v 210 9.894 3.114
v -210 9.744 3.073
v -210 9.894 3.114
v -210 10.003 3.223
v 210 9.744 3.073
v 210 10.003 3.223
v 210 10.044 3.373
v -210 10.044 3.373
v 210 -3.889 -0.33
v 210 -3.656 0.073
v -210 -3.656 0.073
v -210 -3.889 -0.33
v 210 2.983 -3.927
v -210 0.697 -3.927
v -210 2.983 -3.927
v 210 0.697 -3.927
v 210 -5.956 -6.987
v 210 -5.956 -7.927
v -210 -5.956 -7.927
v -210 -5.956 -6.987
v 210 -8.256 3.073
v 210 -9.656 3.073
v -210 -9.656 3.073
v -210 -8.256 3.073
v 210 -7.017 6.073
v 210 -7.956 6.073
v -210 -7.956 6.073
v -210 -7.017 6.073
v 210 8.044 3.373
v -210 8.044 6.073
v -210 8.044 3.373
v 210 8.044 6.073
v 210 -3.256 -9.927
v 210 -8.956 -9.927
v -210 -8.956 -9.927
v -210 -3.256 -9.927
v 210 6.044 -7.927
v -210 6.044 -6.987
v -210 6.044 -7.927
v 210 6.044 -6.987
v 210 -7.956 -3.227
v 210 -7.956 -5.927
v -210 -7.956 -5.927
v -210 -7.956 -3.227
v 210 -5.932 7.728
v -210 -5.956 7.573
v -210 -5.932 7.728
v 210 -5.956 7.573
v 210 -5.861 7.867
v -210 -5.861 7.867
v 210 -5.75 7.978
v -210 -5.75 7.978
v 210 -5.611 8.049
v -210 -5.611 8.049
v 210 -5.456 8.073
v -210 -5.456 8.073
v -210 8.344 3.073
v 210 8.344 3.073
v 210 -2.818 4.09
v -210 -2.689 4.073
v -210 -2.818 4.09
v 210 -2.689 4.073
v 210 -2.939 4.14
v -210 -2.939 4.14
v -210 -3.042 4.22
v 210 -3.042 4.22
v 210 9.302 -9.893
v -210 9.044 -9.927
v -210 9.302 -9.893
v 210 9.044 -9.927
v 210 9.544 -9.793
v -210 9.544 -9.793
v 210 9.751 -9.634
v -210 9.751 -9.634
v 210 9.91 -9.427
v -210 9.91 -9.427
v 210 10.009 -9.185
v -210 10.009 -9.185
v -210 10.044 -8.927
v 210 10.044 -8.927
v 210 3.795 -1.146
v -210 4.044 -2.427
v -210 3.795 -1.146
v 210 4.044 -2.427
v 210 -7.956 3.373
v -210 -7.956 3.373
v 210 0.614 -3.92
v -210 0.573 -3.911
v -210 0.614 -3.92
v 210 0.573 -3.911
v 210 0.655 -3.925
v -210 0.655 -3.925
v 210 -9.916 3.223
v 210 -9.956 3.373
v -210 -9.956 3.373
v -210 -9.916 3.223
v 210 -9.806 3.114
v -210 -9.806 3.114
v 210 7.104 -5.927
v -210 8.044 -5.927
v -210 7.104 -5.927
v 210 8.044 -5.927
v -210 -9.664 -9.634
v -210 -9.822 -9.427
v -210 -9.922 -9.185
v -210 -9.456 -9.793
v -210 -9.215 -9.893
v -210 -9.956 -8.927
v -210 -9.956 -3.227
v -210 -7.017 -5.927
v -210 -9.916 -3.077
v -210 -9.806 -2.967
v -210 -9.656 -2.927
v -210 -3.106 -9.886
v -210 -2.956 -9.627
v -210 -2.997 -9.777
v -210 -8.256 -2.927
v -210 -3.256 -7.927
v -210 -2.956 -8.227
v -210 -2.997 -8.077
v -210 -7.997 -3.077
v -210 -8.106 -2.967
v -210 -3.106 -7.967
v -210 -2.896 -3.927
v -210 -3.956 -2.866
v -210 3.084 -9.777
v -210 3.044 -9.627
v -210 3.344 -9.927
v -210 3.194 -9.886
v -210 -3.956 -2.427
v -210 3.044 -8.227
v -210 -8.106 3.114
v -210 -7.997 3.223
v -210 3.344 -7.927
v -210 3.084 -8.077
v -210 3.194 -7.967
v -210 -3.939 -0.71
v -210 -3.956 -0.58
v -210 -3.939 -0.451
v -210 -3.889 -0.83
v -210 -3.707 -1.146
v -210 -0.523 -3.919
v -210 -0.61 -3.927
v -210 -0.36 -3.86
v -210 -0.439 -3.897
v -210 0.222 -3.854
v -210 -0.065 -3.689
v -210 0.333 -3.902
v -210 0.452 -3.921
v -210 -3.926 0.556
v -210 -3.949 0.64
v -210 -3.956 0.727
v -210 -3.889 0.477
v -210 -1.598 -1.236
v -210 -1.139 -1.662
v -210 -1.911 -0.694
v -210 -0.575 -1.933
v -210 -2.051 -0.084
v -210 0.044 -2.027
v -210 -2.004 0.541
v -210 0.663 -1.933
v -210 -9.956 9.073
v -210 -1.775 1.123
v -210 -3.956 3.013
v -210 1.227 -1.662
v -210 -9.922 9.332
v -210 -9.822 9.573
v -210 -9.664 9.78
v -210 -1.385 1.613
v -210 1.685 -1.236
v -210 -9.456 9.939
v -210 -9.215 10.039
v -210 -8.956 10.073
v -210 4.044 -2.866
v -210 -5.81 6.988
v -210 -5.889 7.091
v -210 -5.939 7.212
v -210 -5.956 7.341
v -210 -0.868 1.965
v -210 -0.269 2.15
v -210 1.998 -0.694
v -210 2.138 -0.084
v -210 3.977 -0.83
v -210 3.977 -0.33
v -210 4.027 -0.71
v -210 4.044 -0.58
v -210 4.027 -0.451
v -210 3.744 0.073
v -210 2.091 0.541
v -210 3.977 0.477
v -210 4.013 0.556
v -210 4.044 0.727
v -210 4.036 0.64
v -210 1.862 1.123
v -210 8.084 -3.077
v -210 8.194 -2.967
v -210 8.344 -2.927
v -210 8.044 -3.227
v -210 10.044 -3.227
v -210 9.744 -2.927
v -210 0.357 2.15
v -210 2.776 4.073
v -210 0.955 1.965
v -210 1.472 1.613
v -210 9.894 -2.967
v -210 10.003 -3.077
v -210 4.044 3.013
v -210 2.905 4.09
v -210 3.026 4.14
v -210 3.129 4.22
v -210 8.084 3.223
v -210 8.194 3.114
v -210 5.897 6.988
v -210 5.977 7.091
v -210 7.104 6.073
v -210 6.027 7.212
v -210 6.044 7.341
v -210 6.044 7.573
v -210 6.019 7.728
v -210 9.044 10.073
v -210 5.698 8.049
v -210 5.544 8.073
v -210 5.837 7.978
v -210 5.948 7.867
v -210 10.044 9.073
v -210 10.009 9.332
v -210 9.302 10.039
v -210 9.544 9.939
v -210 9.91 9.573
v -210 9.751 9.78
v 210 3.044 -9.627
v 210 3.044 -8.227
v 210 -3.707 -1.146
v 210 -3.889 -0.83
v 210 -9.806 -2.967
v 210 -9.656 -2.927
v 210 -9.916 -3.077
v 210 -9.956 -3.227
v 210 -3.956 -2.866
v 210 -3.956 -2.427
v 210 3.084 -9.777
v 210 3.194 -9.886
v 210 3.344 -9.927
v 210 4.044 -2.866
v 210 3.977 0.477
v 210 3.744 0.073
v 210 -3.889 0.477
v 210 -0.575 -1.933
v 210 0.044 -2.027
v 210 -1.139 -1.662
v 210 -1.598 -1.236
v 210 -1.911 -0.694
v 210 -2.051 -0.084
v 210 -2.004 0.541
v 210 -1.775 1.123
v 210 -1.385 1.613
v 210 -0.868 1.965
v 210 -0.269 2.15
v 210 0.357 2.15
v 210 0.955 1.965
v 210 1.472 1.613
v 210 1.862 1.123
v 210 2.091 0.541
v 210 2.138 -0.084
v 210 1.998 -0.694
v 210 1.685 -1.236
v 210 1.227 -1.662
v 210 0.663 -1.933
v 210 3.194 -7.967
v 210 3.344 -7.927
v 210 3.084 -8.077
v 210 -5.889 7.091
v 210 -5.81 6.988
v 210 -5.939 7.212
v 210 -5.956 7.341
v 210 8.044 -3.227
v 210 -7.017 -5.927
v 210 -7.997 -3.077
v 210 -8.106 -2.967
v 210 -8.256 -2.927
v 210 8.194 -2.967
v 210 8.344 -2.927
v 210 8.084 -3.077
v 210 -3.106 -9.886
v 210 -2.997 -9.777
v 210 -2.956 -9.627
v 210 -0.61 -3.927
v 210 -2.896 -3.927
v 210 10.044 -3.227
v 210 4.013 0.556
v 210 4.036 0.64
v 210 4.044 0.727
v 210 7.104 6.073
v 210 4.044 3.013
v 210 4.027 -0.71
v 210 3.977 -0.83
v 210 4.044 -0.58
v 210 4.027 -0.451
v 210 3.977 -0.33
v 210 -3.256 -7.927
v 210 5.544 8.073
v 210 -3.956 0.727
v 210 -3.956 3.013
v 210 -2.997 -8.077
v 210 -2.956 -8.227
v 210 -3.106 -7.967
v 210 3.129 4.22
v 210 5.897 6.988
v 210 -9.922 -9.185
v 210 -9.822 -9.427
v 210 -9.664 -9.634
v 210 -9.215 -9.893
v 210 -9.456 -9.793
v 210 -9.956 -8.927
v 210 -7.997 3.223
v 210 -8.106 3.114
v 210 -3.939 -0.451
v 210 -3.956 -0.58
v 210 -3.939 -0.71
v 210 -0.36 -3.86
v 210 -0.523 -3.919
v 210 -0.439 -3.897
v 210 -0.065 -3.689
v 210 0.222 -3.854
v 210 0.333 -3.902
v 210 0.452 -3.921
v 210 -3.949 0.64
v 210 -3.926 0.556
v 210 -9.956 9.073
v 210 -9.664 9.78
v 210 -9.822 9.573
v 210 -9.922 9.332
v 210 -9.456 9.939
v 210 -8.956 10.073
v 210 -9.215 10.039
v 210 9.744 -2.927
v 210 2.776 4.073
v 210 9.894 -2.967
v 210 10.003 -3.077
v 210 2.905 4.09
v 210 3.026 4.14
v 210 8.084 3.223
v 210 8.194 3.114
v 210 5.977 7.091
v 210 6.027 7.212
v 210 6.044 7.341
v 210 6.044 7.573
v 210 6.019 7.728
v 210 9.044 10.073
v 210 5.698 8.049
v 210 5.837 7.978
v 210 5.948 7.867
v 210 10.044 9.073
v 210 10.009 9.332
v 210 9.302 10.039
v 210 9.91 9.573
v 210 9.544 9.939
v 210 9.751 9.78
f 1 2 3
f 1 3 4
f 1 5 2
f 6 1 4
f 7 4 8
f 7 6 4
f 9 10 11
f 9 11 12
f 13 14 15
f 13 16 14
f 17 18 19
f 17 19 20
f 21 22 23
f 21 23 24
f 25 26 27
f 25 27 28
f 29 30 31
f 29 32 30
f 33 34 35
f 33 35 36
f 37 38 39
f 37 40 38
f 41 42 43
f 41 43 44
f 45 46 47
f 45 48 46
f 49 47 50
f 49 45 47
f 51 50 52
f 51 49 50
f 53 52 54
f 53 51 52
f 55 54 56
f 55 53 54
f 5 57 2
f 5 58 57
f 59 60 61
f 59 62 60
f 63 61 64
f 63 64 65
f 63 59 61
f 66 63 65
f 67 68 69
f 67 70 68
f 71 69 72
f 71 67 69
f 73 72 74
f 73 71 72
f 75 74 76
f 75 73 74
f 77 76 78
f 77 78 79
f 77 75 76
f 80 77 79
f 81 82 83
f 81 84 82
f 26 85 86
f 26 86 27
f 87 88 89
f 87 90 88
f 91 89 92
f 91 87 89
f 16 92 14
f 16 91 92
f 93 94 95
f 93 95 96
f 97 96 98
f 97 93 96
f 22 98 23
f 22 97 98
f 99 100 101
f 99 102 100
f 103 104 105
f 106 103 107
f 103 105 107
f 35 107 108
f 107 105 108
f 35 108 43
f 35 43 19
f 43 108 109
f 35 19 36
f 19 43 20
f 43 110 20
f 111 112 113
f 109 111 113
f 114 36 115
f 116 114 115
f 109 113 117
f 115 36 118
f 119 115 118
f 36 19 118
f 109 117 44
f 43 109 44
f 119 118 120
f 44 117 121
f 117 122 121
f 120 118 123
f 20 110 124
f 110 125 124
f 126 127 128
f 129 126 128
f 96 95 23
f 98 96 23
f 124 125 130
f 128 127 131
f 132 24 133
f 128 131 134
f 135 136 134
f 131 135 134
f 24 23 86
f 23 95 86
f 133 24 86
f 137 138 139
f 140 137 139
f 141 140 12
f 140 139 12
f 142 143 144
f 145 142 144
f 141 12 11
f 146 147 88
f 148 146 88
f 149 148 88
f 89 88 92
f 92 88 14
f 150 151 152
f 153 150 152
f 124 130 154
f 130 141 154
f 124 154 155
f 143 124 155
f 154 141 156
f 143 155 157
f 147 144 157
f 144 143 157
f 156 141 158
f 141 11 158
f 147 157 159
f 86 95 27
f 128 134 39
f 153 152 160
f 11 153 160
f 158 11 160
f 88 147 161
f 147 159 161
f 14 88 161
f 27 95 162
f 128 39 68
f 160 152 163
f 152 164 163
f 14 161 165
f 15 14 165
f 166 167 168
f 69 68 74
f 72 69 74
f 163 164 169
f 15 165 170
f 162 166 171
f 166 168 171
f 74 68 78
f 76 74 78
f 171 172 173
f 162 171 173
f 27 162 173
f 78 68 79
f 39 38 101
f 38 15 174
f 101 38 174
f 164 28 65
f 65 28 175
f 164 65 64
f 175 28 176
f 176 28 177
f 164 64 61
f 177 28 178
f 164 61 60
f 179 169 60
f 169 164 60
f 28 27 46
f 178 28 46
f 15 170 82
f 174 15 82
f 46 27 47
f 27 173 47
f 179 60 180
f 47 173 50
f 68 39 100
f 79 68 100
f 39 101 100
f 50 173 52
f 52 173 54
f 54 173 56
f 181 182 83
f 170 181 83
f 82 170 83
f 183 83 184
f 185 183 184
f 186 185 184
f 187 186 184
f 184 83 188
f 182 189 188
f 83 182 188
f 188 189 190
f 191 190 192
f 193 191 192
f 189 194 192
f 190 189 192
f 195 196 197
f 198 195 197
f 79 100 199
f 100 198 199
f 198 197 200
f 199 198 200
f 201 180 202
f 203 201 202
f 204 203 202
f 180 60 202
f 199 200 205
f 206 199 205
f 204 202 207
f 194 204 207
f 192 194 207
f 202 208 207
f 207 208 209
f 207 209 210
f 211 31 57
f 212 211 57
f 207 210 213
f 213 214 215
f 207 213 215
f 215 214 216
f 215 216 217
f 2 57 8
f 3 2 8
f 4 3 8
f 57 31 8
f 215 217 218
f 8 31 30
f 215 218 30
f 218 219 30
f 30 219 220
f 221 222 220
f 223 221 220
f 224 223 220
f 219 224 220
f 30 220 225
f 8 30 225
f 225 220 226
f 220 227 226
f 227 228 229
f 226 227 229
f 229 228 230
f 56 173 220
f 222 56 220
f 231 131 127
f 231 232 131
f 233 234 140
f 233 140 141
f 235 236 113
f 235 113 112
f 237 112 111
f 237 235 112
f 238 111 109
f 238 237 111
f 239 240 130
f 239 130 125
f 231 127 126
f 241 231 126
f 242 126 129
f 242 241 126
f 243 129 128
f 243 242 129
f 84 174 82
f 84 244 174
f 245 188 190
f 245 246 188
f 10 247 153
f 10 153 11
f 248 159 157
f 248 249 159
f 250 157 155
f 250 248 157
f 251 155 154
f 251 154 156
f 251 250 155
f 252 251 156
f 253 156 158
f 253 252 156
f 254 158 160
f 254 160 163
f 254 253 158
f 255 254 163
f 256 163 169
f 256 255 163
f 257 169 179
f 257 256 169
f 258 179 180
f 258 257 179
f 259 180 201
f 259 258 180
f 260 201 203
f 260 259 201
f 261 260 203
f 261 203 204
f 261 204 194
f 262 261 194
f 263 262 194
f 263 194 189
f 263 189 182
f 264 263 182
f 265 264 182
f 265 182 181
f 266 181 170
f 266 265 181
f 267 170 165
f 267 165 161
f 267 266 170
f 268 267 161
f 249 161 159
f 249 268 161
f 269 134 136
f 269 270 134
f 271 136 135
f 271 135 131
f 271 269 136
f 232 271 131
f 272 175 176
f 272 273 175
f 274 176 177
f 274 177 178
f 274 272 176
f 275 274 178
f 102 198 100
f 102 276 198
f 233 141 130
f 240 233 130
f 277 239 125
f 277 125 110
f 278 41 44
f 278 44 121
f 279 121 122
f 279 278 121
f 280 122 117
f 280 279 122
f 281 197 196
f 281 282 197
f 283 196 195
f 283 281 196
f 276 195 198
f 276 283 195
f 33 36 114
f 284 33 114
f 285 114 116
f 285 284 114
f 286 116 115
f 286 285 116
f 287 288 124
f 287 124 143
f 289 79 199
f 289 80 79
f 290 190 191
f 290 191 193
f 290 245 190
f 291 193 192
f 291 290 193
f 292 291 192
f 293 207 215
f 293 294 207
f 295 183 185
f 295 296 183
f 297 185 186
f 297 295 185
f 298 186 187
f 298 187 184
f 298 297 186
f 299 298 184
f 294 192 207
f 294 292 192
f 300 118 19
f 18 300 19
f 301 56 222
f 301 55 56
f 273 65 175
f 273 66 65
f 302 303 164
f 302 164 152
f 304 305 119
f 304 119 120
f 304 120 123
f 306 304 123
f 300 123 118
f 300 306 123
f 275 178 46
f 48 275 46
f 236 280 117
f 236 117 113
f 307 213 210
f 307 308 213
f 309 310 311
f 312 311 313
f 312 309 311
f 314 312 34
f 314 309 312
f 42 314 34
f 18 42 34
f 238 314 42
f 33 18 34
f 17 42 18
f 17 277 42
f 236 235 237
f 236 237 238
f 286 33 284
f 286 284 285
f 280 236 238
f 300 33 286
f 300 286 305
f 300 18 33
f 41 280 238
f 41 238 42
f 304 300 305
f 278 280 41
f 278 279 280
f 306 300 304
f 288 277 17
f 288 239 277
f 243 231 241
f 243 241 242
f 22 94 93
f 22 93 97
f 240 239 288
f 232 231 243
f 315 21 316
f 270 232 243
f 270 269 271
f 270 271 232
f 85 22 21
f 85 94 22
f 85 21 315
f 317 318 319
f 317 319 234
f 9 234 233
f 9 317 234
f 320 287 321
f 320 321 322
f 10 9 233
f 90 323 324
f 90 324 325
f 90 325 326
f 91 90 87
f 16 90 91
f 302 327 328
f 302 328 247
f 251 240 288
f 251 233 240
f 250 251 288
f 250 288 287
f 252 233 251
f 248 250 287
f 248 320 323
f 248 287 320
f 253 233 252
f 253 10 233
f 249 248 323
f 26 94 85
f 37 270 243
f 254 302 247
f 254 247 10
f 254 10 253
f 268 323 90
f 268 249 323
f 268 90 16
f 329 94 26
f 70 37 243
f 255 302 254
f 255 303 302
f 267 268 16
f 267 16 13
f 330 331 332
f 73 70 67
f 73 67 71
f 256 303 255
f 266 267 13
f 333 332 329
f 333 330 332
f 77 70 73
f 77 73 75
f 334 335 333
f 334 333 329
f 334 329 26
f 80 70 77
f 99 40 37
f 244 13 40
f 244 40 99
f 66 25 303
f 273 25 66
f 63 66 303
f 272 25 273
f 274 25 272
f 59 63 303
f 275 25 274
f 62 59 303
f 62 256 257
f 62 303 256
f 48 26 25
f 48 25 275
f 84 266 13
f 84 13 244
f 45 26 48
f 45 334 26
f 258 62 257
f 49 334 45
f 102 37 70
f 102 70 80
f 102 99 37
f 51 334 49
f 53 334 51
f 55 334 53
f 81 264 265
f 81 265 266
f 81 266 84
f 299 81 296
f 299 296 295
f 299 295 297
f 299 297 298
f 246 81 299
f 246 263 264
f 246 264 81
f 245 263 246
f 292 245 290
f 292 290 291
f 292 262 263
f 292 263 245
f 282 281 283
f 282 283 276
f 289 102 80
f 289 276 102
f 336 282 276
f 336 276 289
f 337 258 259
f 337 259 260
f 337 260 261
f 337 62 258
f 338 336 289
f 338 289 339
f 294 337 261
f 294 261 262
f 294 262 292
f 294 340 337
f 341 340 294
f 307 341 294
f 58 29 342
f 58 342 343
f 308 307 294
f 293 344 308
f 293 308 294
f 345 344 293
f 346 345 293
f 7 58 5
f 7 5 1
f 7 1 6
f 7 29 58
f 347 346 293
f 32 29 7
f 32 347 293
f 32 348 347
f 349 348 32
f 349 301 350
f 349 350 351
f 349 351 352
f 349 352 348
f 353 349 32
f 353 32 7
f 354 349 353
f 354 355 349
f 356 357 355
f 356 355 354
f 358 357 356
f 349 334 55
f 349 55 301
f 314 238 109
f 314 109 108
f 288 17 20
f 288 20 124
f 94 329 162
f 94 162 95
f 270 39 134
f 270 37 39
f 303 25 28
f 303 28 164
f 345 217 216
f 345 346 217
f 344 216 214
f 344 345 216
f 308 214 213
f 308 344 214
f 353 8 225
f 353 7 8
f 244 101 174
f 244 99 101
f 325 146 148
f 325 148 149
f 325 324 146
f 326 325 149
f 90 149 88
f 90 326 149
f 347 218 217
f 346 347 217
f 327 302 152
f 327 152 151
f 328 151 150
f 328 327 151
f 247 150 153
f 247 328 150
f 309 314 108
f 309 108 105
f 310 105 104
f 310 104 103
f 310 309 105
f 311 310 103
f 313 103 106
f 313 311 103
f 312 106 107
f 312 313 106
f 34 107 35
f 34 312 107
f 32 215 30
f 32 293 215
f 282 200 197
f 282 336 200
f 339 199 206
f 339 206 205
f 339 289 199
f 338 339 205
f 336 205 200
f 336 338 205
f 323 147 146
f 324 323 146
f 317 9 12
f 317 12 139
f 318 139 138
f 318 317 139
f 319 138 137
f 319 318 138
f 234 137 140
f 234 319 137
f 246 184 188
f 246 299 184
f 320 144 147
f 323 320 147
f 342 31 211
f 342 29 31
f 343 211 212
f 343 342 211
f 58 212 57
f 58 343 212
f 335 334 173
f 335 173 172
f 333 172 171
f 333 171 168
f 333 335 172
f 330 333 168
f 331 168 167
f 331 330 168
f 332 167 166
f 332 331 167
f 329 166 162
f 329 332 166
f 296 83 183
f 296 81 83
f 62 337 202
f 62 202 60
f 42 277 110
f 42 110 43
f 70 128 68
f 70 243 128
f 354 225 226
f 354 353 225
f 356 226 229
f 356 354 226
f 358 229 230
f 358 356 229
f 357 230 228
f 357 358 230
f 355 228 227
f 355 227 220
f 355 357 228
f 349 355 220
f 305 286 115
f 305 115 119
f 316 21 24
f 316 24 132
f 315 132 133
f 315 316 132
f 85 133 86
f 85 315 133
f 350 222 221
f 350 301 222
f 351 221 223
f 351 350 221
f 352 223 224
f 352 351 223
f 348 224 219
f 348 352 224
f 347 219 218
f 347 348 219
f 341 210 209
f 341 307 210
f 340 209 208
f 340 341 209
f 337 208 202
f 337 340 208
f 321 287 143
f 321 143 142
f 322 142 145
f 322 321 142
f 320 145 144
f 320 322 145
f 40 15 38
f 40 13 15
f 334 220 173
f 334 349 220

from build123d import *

# Parameters (mm, degrees)
F1_DEPTH = 210


# Not quite as in the source:
# - ends of sketch curves that miss each other by under 0.0002 mm in the source are joined


with BuildPart() as f1:
    # F0 (on Right) → F1 (new body, symmetric)
    with BuildSketch(Plane.YZ):
        with BuildLine():
            Line((9.043565, 10.073321), (0.043565, 10.073321))
            Line((0.043565, 10.073321), (-8.956435, 10.073321))
            ThreePointArc((-8.956435, 10.073321), (-9.6635417812, 9.7804277812), (-9.956435, 9.073321))
            Line((-9.956435, 9.073321), (-9.956435, 3.373321))
            ThreePointArc((-9.956435, 3.373321), (-9.8685670344, 3.1611889656), (-9.656435, 3.073321))
            Line((-9.656435, 3.073321), (-8.256435, 3.073321))
            ThreePointArc((-8.256435, 3.073321), (-8.0443029656, 3.1611889656), (-7.956435, 3.373321))
            Line((-7.956435, 3.373321), (-7.956435, 6.073321))
            Line((-7.956435, 6.073321), (-7.017095, 6.073321))
            Line((-7.017095, 6.073321), (-3.956435, 3.012661))
            Line((-3.956435, 3.012661), (-3.956435, 0.726911))
            ThreePointArc((-3.956435, 0.726911), (-3.9393979324, 0.5975015494), (-3.8894477764, 0.4769111291))
            Line((-3.8894477764, 0.4769111291), (-3.656435, 0.073321))
            Line((-3.656435, 0.073321), (-3.889448, -0.330269))
            ThreePointArc((-3.889448, -0.330269), (-3.956435, -0.580269), (-3.8894477764, -0.8302688709))
            Line((-3.8894477764, -0.8302688709), (-3.707412, -1.145565))
            Line((-3.707412, -1.145565), (-3.956435, -2.426679))
            Line((-3.956435, -2.426679), (-3.956435, -2.866019))
            Line((-3.956435, -2.866019), (-7.017095, -5.926679))
            Line((-7.017095, -5.926679), (-7.956435, -5.926679))
            Line((-7.956435, -5.926679), (-7.956435, -3.226679))
            ThreePointArc((-7.956435, -3.226679), (-8.0443029656, -3.0145469656), (-8.256435, -2.926679))
            Line((-8.256435, -2.926679), (-9.656435, -2.926679))
            ThreePointArc((-9.656435, -2.926679), (-9.8685670344, -3.0145469656), (-9.956435, -3.226679))
            Line((-9.956435, -3.226679), (-9.956435, -8.926679))
            ThreePointArc((-9.956435, -8.926679), (-9.6635417812, -9.6337857812), (-8.956435, -9.926679))
            Line((-8.956435, -9.926679), (-3.256435, -9.926679))
            ThreePointArc((-3.256435, -9.926679), (-3.0443029656, -9.8388110344), (-2.956435, -9.626679))
            Line((-2.956435, -9.626679), (-2.956435, -8.226679))
            ThreePointArc((-2.956435, -8.226679), (-3.0443029656, -8.0145469656), (-3.256435, -7.926679))
            Line((-3.256435, -7.926679), (-5.956435, -7.926679))
            Line((-5.956435, -7.926679), (-5.956435, -6.987339))
            Line((-5.956435, -6.987339), (-2.895775, -3.926679))
            Line((-2.895775, -3.926679), (-0.610025, -3.926679))
            ThreePointArc((-0.610025, -3.926679), (-0.4806155494, -3.9096419324), (-0.3600251291, -3.8596917764))
            Line((-0.3600251291, -3.8596917764), (-0.0645959325, -3.6891257984))
            Line((-0.0645959325, -3.6891257984), (0.2217128734, -3.8544264098))
            ThreePointArc((0.2217128734, -3.8544264098), (0.3921793907, -3.9150473077), (0.5730594828, -3.9110345539))
            ThreePointArc((0.5730594828, -3.9110345539), (0.6346161199, -3.9227524708), (0.697155, -3.926679))
            Line((0.697155, -3.926679), (2.982905, -3.926679))
            Line((2.982905, -3.926679), (6.043565, -6.987339))
            Line((6.043565, -6.987339), (6.043565, -7.926679))
            Line((6.043565, -7.926679), (3.343565, -7.926679))
            ThreePointArc((3.343565, -7.926679), (3.1314329656, -8.0145469656), (3.043565, -8.226679))
            Line((3.043565, -8.226679), (3.043565, -9.626679))
            ThreePointArc((3.043565, -9.626679), (3.1314329656, -9.8388110344), (3.343565, -9.926679))
            Line((3.343565, -9.926679), (9.043565, -9.926679))
            ThreePointArc((9.043565, -9.926679), (9.7506717812, -9.6337857812), (10.043565, -8.926679))
            Line((10.043565, -8.926679), (10.043565, -3.226679))
            ThreePointArc((10.043565, -3.226679), (9.9556970344, -3.0145469656), (9.743565, -2.926679))
            Line((9.743565, -2.926679), (8.343565, -2.926679))
            ThreePointArc((8.343565, -2.926679), (8.1314329656, -3.0145469656), (8.043565, -3.226679))
            Line((8.043565, -3.226679), (8.043565, -5.926679))
            Line((8.043565, -5.926679), (7.104225, -5.926679))
            Line((7.104225, -5.926679), (4.043565, -2.866019))
            Line((4.043565, -2.866019), (4.043565, -2.426679))
            Line((4.043565, -2.426679), (3.794542, -1.145565))
            Line((3.794542, -1.145565), (3.976578, -0.830269))
            ThreePointArc((3.976578, -0.830269), (4.043565, -0.580269), (3.9765777764, -0.3302691291))
            Line((3.9765777764, -0.3302691291), (3.743565, 0.073321))
            Line((3.743565, 0.073321), (3.976578, 0.476911))
            ThreePointArc((3.976578, 0.476911), (4.0265279324, 0.5975015494), (4.043565, 0.726911))
            Line((4.043565, 0.726911), (4.043565, 3.012661))
            Line((4.043565, 3.012661), (7.104225, 6.073321))
            Line((7.104225, 6.073321), (8.043565, 6.073321))
            Line((8.043565, 6.073321), (8.043565, 3.373321))
            ThreePointArc((8.043565, 3.373321), (8.1314329656, 3.1611889656), (8.343565, 3.073321))
            Line((8.343565, 3.073321), (9.743565, 3.073321))
            ThreePointArc((9.743565, 3.073321), (9.9556970344, 3.1611889656), (10.043565, 3.373321))
            Line((10.043565, 3.373321), (10.043565, 9.073321))
            ThreePointArc((10.043565, 9.073321), (9.7506717812, 9.7804277812), (9.043565, 10.073321))
        make_face()
        with BuildLine():
            ThreePointArc((0.043565, 2.173321), (2.143565, 0.073321), (0.043565, -2.026679))
            ThreePointArc((0.043565, -2.026679), (-2.056435, 0.073321), (0.043565, 2.173321))
        make_face(mode=Mode.SUBTRACT)
        with BuildLine():
            Line((2.775798, 4.073321), (0.043565, 4.073321))
            Line((0.043565, 4.073321), (-2.688668, 4.073321))
            ThreePointArc((-2.688668, 4.073321), (-2.8800097162, 4.1113812337), (-3.0422213906, 4.2197676094))
            Line((-3.0422213906, 4.2197676094), (-5.809988, 6.987535))
            ThreePointArc((-5.809988, 6.987535), (-5.9183747663, 7.1497462838), (-5.956435, 7.341088))
            Line((-5.956435, 7.341088), (-5.956435, 7.573321))
            ThreePointArc((-5.956435, 7.573321), (-5.8099883906, 7.9268743906), (-5.456435, 8.073321))
            Line((-5.456435, 8.073321), (0.043565, 8.073321))
            Line((0.043565, 8.073321), (5.543565, 8.073321))
            ThreePointArc((5.543565, 8.073321), (5.8971183906, 7.9268743906), (6.043565, 7.573321))
            Line((6.043565, 7.573321), (6.043565, 7.341088))
            ThreePointArc((6.043565, 7.341088), (6.0055047663, 7.1497462838), (5.8971183906, 6.9875346094))
            Line((5.8971183906, 6.9875346094), (3.129351, 4.219768))
            ThreePointArc((3.129351, 4.219768), (2.9671397162, 4.1113812337), (2.775798, 4.073321))
        make_face(mode=Mode.SUBTRACT)
    extrude(amount=F1_DEPTH, both=True)


solid = f1.part
